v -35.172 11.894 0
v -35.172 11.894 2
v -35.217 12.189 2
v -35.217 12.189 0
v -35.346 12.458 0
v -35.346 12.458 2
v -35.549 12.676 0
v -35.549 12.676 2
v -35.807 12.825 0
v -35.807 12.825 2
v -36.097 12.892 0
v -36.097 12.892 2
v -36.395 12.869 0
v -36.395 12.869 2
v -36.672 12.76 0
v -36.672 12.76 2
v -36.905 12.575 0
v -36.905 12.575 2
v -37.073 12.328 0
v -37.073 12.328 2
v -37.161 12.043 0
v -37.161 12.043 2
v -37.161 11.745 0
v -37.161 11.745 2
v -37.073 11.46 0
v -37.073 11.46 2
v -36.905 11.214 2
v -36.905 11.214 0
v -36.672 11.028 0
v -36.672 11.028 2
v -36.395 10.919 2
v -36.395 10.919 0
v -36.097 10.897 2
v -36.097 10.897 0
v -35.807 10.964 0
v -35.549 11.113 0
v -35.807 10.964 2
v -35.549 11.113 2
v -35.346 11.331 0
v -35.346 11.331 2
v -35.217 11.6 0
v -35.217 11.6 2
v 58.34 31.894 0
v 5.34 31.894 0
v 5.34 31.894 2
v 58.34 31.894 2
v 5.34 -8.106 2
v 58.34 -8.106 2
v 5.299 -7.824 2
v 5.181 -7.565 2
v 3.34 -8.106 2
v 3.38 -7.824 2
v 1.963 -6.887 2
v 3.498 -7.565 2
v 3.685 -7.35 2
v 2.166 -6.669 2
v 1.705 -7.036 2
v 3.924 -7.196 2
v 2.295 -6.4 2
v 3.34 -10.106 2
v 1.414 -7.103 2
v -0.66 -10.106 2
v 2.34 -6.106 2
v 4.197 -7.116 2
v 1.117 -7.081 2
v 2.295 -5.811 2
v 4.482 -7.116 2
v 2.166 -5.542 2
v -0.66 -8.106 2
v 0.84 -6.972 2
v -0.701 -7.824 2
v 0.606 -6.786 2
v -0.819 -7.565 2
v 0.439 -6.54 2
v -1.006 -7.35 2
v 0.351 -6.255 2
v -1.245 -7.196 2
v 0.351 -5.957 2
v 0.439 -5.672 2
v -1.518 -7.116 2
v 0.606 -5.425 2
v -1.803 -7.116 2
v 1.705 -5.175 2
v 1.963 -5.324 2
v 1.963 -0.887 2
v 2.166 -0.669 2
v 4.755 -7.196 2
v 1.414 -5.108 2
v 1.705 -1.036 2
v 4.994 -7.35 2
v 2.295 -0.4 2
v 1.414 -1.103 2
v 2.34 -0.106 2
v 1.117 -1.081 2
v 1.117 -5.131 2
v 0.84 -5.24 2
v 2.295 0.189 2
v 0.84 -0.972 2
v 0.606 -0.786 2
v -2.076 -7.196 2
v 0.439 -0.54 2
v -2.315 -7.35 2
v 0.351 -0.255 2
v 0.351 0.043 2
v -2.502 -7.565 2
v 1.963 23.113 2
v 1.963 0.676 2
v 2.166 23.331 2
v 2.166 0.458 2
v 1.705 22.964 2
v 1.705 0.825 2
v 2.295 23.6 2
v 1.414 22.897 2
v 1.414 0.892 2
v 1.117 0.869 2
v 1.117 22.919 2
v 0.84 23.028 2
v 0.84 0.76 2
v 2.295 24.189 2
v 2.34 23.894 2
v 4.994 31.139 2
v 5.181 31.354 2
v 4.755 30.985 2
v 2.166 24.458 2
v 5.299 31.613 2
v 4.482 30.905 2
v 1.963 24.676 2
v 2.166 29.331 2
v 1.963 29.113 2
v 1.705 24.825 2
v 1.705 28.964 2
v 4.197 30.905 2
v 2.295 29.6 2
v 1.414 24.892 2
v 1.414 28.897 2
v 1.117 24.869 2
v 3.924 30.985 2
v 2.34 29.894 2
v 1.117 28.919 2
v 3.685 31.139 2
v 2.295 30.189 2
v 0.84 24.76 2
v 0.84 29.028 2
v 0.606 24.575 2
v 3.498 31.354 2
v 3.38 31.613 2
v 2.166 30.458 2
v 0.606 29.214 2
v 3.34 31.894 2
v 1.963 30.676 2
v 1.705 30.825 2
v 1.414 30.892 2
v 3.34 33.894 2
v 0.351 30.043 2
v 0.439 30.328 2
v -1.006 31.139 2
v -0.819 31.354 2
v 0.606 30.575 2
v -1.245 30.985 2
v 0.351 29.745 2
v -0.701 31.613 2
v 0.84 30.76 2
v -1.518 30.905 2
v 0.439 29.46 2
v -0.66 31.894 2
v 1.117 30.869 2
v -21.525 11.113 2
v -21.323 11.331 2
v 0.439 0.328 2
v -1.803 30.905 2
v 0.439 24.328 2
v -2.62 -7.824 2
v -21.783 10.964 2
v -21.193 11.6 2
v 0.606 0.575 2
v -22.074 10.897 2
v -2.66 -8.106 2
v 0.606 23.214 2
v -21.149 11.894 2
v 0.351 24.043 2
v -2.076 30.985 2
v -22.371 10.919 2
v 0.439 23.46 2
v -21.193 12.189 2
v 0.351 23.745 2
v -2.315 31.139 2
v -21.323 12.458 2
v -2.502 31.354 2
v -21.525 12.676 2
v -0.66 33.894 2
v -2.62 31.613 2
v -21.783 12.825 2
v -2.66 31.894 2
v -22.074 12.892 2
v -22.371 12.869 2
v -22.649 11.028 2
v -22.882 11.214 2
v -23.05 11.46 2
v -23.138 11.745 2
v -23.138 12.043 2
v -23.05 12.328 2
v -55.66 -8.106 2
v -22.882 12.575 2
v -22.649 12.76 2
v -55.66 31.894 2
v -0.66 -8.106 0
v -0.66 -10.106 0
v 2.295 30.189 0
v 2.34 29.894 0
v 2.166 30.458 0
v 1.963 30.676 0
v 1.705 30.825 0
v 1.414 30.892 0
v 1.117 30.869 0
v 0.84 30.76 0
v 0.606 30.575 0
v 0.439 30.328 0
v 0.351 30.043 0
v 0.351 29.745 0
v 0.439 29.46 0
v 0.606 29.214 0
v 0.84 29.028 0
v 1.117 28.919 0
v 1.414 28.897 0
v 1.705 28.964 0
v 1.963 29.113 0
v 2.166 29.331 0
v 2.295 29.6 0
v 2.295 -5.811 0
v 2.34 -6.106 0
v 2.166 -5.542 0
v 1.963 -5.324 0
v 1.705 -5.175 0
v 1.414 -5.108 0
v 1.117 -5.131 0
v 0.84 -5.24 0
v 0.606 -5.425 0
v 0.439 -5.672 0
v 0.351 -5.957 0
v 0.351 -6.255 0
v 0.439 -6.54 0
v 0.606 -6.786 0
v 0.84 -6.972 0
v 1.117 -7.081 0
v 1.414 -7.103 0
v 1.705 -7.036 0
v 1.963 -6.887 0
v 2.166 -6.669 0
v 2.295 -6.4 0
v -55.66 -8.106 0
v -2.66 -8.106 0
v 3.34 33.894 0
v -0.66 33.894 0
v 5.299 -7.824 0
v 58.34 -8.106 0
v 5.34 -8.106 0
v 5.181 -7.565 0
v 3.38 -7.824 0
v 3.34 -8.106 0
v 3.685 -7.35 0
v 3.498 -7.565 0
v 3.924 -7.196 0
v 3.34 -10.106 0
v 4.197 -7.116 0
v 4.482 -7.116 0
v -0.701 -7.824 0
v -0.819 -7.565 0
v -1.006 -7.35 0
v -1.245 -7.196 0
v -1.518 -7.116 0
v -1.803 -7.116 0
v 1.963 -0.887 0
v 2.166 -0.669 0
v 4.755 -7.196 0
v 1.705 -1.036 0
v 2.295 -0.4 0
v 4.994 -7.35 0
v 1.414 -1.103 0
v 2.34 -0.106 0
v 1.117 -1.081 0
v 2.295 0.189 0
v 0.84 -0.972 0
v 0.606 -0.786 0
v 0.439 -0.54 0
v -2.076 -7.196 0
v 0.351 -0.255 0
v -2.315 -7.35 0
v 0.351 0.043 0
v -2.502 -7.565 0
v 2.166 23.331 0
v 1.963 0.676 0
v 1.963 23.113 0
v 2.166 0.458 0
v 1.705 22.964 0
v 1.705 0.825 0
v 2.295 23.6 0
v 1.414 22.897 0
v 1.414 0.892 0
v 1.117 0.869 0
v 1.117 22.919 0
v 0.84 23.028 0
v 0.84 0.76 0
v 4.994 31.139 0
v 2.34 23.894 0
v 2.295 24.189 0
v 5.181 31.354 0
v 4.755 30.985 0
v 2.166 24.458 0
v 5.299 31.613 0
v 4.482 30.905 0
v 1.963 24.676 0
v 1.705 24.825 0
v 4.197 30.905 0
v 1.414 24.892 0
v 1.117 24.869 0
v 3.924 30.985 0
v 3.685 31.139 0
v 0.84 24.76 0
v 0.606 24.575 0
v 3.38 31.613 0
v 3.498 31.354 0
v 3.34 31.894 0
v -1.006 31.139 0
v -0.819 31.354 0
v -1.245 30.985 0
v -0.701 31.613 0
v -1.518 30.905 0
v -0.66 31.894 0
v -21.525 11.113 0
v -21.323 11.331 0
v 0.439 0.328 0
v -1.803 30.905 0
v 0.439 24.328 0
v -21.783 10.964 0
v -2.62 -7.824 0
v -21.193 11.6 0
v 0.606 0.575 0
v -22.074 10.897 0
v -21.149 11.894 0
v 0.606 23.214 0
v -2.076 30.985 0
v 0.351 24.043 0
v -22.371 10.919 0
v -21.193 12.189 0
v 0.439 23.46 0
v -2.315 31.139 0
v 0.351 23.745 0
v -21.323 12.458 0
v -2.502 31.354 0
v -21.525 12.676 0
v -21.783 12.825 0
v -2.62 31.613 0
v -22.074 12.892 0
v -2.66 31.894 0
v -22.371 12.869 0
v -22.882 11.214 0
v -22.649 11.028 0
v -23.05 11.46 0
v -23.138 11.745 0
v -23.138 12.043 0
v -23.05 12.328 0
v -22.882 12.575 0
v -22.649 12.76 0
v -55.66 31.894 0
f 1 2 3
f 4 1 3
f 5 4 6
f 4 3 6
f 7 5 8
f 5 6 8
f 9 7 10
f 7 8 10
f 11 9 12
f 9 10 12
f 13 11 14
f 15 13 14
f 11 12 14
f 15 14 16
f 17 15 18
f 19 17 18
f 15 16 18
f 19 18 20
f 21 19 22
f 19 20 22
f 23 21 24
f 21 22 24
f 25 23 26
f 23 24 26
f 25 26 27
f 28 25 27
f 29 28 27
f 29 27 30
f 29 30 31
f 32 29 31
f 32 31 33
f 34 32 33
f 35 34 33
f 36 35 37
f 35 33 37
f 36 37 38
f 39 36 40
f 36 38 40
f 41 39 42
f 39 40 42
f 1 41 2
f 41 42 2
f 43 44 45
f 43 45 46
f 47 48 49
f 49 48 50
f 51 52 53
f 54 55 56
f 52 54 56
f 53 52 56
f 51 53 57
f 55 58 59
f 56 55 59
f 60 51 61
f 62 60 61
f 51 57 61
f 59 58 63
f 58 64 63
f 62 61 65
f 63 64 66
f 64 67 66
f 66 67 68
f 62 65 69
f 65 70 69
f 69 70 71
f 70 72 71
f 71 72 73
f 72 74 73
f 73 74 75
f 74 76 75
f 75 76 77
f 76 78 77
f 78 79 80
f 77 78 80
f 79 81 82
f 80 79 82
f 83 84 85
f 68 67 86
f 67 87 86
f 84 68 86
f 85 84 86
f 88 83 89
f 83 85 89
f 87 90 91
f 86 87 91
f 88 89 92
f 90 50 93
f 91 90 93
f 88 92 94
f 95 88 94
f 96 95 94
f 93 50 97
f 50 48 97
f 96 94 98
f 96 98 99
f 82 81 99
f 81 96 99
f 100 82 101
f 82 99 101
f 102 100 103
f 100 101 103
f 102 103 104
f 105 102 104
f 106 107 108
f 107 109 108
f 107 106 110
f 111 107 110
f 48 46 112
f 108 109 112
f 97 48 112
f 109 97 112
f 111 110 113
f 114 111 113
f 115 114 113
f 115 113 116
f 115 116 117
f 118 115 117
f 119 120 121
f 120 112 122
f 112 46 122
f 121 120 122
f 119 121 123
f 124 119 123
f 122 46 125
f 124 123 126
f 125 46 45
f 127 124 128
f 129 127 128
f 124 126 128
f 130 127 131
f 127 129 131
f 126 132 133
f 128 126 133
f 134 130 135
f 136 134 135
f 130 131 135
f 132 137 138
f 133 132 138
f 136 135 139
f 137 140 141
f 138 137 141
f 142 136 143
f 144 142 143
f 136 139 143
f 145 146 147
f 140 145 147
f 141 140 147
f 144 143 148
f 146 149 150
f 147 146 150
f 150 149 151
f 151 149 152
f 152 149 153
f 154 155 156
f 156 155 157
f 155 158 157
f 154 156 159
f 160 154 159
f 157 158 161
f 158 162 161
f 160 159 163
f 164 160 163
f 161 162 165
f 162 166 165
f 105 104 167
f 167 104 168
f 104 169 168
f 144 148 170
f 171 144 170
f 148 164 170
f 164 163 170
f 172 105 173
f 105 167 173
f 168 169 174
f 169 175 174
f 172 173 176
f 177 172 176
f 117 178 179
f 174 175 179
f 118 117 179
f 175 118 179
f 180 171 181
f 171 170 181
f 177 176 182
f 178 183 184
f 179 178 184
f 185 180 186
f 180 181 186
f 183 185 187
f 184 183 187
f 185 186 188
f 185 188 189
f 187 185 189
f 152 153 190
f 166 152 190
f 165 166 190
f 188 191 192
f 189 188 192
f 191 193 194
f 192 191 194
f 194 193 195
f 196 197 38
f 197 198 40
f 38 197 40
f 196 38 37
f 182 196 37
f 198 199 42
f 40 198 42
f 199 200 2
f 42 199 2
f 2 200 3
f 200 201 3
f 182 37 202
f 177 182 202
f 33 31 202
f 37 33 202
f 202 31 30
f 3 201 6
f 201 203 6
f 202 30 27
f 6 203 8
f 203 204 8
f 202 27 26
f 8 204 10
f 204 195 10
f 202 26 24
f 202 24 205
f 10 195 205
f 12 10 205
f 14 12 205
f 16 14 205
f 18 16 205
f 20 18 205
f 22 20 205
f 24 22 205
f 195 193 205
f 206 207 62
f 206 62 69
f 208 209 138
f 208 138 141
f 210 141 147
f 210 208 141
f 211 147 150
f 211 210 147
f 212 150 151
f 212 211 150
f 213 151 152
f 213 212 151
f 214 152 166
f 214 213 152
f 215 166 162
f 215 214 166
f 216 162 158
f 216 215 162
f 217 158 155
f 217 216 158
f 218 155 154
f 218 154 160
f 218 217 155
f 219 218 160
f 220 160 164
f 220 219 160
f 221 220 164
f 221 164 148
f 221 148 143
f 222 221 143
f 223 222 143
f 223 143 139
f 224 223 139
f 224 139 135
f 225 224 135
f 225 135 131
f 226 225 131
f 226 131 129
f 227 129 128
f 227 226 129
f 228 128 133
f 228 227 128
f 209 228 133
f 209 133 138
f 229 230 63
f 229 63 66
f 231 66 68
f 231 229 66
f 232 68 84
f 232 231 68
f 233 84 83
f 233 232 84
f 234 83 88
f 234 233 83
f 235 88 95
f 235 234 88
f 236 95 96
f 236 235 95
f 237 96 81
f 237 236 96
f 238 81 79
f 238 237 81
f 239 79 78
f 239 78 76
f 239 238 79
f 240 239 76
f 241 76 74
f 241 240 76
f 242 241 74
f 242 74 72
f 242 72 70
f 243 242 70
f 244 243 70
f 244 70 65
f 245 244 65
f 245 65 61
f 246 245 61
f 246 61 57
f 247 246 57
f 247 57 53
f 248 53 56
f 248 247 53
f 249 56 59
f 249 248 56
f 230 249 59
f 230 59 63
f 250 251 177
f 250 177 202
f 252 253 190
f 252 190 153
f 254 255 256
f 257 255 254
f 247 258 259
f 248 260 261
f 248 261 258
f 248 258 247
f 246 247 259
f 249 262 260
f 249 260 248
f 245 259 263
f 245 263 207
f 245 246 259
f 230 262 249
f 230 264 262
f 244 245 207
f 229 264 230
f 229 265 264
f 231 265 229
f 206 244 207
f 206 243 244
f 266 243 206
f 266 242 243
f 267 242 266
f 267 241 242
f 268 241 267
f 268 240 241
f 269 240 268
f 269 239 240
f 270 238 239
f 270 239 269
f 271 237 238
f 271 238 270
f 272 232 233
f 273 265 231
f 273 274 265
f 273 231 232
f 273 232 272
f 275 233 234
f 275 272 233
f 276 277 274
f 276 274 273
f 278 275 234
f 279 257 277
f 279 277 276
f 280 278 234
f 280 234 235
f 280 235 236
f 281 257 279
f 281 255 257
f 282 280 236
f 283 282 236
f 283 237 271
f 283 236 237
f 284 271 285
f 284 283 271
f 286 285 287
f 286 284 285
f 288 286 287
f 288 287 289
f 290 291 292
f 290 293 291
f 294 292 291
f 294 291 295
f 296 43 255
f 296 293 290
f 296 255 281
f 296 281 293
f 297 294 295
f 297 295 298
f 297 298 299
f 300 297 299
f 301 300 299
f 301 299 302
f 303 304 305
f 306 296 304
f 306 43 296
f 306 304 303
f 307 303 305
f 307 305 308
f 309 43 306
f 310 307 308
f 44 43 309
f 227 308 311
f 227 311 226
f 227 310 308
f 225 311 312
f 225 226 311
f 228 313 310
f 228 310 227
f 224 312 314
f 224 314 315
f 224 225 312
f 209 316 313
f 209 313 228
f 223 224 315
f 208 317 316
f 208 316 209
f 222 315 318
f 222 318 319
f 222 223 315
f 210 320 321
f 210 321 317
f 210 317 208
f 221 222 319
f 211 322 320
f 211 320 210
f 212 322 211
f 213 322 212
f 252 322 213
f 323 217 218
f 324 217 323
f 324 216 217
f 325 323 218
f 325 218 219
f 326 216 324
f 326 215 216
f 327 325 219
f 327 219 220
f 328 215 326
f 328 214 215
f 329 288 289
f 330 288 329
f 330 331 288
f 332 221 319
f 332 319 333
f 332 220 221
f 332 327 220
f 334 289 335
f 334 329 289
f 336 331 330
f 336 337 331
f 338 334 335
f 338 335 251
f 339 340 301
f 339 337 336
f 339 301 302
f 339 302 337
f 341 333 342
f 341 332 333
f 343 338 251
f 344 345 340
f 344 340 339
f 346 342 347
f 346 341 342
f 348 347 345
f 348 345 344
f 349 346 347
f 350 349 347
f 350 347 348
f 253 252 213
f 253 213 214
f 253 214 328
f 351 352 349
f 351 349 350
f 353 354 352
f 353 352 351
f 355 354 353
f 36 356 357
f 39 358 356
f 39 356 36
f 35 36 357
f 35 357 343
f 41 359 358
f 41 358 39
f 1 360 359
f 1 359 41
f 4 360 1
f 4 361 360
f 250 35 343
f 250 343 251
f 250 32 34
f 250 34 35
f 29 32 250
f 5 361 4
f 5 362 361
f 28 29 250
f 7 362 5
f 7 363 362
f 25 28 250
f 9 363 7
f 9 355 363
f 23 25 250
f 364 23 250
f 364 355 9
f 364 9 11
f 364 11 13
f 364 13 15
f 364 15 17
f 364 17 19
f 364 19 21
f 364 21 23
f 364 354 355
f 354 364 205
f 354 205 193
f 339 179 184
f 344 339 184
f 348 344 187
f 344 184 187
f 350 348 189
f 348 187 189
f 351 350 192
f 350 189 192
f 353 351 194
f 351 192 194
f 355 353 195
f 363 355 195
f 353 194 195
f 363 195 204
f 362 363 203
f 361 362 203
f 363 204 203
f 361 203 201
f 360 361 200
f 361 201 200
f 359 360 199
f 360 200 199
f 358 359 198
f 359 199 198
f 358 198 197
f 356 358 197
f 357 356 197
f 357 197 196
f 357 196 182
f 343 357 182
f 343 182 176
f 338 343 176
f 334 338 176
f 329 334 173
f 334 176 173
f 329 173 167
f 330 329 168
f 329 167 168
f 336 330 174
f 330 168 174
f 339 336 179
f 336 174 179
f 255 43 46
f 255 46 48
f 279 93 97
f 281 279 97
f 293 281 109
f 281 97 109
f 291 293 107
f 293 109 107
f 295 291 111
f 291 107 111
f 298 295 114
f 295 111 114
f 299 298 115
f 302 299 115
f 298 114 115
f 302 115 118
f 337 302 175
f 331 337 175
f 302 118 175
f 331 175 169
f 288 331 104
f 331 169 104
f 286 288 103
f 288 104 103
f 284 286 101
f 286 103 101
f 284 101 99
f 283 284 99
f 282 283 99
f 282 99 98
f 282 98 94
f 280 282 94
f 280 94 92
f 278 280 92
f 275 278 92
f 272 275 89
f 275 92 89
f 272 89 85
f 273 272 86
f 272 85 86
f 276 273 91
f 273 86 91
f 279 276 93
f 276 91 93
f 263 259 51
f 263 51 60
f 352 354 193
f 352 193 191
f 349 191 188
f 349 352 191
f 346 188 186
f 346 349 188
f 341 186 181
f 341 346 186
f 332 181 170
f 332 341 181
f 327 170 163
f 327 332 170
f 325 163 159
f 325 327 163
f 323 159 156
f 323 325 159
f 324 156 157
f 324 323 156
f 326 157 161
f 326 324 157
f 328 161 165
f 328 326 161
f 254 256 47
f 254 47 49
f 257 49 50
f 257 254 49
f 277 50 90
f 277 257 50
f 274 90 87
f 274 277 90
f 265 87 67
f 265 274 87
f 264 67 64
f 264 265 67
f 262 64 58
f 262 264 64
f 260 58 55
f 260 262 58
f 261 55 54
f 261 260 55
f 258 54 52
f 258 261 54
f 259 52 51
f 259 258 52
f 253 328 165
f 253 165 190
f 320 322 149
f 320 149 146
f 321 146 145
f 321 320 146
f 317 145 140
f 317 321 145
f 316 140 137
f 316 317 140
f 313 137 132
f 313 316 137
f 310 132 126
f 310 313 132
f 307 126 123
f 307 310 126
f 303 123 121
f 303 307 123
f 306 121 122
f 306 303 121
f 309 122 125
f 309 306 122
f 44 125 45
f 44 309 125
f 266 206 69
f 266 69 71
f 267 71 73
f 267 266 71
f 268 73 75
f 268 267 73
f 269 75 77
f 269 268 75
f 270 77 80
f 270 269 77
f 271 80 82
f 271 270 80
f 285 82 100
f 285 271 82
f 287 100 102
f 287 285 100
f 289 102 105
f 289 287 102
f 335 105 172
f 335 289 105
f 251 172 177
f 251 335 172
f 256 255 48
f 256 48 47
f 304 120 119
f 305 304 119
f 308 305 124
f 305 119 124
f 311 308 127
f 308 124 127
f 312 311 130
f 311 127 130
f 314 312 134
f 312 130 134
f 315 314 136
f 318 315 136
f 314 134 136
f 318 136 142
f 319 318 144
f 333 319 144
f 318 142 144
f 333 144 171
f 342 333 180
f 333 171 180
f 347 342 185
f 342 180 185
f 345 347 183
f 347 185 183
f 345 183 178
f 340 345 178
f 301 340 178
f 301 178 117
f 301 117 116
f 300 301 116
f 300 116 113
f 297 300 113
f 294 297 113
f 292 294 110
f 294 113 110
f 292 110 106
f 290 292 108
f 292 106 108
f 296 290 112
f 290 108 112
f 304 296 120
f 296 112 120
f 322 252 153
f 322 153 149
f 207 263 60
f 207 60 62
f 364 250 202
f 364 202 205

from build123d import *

# Parameters (mm, degrees)
SKETCH_1_R          = 1
EXTRUDE_1_DEPTH     = 2
SKETCH_2_R          = 1
CUT_EXTRUDE_1_DEPTH = 2


with BuildPart() as part:
    # 草圖1 → 填料-伸長1 (new body)
    with BuildSketch(Plane.XY):
        with BuildLine():
            Line((5.339530581, 31.894382022), (57.339530581, 31.894382022))
            Line((57.339530581, 31.894382022), (58.339530581, 31.894382022))
            Line((58.339530581, 31.894382022), (58.339530581, 30.894382022))
            Line((58.339530581, 30.894382022), (58.339530581, -7.105617978))
            Line((58.339530581, -7.105617978), (58.339530581, -8.105617978))
            Line((58.339530581, -8.105617978), (57.339530581, -8.105617978))
            Line((57.339530581, -8.105617978), (5.339530581, -8.105617978))
            ThreePointArc((5.339530581, -8.105617978), (4.339530581, -7.105617978), (3.339530581, -8.105617978))
            Line((3.339530581, -8.105617978), (3.339530581, -10.105617978))
            Line((3.339530581, -10.105617978), (-0.660469419, -10.105617978))
            Line((-0.660469419, -10.105617978), (-0.660469419, -8.105617978))
            ThreePointArc((-0.660469419, -8.105617978), (-1.660469419, -7.105617978), (-2.660469419, -8.105617978))
            Line((-2.660469419, -8.105617978), (-54.660469419, -8.105617978))
            Line((-54.660469419, -8.105617978), (-55.660469419, -8.105617978))
            Line((-55.660469419, -8.105617978), (-55.660469419, -7.105617978))
            Line((-55.660469419, -7.105617978), (-55.660469419, 30.894382022))
            Line((-55.660469419, 30.894382022), (-55.660469419, 31.894382022))
            Line((-55.660469419, 31.894382022), (-54.660469419, 31.894382022))
            Line((-54.660469419, 31.894382022), (-2.660469419, 31.894382022))
            ThreePointArc((-2.660469419, 31.894382022), (-1.660469419, 30.894382022), (-0.660469419, 31.894382022))
            Line((-0.660469419, 31.894382022), (-0.660469419, 33.894382022))
            Line((-0.660469419, 33.894382022), (3.339530581, 33.894382022))
            Line((3.339530581, 33.894382022), (3.339530581, 31.894382022))
            ThreePointArc((3.339530581, 31.894382022), (4.339530581, 30.894382022), (5.339530581, 31.894382022))
        make_face()
        with Locations((1.339530581, -6.105617978)):
            Circle(SKETCH_1_R, mode=Mode.SUBTRACT)
        with Locations((1.339530581, 29.894382022)):
            Circle(SKETCH_1_R, mode=Mode.SUBTRACT)
    extrude(amount=EXTRUDE_1_DEPTH)

    # 草圖2 → 除料-伸長1 (cut)
    with BuildSketch(Plane.XY.offset(2)):
        with Locations((1.339530581, 23.894382022)):
            Circle(SKETCH_2_R)
        with Locations((1.339530581, -0.105617978)):
            Circle(SKETCH_2_R)
        with Locations((-36.172114849, 11.894382022)):
            Circle(SKETCH_2_R)
        with Locations((-22.148823989, 11.894382022)):
            Circle(SKETCH_2_R)
    extrude(amount=-CUT_EXTRUDE_1_DEPTH, mode=Mode.SUBTRACT)


solid = part.part
